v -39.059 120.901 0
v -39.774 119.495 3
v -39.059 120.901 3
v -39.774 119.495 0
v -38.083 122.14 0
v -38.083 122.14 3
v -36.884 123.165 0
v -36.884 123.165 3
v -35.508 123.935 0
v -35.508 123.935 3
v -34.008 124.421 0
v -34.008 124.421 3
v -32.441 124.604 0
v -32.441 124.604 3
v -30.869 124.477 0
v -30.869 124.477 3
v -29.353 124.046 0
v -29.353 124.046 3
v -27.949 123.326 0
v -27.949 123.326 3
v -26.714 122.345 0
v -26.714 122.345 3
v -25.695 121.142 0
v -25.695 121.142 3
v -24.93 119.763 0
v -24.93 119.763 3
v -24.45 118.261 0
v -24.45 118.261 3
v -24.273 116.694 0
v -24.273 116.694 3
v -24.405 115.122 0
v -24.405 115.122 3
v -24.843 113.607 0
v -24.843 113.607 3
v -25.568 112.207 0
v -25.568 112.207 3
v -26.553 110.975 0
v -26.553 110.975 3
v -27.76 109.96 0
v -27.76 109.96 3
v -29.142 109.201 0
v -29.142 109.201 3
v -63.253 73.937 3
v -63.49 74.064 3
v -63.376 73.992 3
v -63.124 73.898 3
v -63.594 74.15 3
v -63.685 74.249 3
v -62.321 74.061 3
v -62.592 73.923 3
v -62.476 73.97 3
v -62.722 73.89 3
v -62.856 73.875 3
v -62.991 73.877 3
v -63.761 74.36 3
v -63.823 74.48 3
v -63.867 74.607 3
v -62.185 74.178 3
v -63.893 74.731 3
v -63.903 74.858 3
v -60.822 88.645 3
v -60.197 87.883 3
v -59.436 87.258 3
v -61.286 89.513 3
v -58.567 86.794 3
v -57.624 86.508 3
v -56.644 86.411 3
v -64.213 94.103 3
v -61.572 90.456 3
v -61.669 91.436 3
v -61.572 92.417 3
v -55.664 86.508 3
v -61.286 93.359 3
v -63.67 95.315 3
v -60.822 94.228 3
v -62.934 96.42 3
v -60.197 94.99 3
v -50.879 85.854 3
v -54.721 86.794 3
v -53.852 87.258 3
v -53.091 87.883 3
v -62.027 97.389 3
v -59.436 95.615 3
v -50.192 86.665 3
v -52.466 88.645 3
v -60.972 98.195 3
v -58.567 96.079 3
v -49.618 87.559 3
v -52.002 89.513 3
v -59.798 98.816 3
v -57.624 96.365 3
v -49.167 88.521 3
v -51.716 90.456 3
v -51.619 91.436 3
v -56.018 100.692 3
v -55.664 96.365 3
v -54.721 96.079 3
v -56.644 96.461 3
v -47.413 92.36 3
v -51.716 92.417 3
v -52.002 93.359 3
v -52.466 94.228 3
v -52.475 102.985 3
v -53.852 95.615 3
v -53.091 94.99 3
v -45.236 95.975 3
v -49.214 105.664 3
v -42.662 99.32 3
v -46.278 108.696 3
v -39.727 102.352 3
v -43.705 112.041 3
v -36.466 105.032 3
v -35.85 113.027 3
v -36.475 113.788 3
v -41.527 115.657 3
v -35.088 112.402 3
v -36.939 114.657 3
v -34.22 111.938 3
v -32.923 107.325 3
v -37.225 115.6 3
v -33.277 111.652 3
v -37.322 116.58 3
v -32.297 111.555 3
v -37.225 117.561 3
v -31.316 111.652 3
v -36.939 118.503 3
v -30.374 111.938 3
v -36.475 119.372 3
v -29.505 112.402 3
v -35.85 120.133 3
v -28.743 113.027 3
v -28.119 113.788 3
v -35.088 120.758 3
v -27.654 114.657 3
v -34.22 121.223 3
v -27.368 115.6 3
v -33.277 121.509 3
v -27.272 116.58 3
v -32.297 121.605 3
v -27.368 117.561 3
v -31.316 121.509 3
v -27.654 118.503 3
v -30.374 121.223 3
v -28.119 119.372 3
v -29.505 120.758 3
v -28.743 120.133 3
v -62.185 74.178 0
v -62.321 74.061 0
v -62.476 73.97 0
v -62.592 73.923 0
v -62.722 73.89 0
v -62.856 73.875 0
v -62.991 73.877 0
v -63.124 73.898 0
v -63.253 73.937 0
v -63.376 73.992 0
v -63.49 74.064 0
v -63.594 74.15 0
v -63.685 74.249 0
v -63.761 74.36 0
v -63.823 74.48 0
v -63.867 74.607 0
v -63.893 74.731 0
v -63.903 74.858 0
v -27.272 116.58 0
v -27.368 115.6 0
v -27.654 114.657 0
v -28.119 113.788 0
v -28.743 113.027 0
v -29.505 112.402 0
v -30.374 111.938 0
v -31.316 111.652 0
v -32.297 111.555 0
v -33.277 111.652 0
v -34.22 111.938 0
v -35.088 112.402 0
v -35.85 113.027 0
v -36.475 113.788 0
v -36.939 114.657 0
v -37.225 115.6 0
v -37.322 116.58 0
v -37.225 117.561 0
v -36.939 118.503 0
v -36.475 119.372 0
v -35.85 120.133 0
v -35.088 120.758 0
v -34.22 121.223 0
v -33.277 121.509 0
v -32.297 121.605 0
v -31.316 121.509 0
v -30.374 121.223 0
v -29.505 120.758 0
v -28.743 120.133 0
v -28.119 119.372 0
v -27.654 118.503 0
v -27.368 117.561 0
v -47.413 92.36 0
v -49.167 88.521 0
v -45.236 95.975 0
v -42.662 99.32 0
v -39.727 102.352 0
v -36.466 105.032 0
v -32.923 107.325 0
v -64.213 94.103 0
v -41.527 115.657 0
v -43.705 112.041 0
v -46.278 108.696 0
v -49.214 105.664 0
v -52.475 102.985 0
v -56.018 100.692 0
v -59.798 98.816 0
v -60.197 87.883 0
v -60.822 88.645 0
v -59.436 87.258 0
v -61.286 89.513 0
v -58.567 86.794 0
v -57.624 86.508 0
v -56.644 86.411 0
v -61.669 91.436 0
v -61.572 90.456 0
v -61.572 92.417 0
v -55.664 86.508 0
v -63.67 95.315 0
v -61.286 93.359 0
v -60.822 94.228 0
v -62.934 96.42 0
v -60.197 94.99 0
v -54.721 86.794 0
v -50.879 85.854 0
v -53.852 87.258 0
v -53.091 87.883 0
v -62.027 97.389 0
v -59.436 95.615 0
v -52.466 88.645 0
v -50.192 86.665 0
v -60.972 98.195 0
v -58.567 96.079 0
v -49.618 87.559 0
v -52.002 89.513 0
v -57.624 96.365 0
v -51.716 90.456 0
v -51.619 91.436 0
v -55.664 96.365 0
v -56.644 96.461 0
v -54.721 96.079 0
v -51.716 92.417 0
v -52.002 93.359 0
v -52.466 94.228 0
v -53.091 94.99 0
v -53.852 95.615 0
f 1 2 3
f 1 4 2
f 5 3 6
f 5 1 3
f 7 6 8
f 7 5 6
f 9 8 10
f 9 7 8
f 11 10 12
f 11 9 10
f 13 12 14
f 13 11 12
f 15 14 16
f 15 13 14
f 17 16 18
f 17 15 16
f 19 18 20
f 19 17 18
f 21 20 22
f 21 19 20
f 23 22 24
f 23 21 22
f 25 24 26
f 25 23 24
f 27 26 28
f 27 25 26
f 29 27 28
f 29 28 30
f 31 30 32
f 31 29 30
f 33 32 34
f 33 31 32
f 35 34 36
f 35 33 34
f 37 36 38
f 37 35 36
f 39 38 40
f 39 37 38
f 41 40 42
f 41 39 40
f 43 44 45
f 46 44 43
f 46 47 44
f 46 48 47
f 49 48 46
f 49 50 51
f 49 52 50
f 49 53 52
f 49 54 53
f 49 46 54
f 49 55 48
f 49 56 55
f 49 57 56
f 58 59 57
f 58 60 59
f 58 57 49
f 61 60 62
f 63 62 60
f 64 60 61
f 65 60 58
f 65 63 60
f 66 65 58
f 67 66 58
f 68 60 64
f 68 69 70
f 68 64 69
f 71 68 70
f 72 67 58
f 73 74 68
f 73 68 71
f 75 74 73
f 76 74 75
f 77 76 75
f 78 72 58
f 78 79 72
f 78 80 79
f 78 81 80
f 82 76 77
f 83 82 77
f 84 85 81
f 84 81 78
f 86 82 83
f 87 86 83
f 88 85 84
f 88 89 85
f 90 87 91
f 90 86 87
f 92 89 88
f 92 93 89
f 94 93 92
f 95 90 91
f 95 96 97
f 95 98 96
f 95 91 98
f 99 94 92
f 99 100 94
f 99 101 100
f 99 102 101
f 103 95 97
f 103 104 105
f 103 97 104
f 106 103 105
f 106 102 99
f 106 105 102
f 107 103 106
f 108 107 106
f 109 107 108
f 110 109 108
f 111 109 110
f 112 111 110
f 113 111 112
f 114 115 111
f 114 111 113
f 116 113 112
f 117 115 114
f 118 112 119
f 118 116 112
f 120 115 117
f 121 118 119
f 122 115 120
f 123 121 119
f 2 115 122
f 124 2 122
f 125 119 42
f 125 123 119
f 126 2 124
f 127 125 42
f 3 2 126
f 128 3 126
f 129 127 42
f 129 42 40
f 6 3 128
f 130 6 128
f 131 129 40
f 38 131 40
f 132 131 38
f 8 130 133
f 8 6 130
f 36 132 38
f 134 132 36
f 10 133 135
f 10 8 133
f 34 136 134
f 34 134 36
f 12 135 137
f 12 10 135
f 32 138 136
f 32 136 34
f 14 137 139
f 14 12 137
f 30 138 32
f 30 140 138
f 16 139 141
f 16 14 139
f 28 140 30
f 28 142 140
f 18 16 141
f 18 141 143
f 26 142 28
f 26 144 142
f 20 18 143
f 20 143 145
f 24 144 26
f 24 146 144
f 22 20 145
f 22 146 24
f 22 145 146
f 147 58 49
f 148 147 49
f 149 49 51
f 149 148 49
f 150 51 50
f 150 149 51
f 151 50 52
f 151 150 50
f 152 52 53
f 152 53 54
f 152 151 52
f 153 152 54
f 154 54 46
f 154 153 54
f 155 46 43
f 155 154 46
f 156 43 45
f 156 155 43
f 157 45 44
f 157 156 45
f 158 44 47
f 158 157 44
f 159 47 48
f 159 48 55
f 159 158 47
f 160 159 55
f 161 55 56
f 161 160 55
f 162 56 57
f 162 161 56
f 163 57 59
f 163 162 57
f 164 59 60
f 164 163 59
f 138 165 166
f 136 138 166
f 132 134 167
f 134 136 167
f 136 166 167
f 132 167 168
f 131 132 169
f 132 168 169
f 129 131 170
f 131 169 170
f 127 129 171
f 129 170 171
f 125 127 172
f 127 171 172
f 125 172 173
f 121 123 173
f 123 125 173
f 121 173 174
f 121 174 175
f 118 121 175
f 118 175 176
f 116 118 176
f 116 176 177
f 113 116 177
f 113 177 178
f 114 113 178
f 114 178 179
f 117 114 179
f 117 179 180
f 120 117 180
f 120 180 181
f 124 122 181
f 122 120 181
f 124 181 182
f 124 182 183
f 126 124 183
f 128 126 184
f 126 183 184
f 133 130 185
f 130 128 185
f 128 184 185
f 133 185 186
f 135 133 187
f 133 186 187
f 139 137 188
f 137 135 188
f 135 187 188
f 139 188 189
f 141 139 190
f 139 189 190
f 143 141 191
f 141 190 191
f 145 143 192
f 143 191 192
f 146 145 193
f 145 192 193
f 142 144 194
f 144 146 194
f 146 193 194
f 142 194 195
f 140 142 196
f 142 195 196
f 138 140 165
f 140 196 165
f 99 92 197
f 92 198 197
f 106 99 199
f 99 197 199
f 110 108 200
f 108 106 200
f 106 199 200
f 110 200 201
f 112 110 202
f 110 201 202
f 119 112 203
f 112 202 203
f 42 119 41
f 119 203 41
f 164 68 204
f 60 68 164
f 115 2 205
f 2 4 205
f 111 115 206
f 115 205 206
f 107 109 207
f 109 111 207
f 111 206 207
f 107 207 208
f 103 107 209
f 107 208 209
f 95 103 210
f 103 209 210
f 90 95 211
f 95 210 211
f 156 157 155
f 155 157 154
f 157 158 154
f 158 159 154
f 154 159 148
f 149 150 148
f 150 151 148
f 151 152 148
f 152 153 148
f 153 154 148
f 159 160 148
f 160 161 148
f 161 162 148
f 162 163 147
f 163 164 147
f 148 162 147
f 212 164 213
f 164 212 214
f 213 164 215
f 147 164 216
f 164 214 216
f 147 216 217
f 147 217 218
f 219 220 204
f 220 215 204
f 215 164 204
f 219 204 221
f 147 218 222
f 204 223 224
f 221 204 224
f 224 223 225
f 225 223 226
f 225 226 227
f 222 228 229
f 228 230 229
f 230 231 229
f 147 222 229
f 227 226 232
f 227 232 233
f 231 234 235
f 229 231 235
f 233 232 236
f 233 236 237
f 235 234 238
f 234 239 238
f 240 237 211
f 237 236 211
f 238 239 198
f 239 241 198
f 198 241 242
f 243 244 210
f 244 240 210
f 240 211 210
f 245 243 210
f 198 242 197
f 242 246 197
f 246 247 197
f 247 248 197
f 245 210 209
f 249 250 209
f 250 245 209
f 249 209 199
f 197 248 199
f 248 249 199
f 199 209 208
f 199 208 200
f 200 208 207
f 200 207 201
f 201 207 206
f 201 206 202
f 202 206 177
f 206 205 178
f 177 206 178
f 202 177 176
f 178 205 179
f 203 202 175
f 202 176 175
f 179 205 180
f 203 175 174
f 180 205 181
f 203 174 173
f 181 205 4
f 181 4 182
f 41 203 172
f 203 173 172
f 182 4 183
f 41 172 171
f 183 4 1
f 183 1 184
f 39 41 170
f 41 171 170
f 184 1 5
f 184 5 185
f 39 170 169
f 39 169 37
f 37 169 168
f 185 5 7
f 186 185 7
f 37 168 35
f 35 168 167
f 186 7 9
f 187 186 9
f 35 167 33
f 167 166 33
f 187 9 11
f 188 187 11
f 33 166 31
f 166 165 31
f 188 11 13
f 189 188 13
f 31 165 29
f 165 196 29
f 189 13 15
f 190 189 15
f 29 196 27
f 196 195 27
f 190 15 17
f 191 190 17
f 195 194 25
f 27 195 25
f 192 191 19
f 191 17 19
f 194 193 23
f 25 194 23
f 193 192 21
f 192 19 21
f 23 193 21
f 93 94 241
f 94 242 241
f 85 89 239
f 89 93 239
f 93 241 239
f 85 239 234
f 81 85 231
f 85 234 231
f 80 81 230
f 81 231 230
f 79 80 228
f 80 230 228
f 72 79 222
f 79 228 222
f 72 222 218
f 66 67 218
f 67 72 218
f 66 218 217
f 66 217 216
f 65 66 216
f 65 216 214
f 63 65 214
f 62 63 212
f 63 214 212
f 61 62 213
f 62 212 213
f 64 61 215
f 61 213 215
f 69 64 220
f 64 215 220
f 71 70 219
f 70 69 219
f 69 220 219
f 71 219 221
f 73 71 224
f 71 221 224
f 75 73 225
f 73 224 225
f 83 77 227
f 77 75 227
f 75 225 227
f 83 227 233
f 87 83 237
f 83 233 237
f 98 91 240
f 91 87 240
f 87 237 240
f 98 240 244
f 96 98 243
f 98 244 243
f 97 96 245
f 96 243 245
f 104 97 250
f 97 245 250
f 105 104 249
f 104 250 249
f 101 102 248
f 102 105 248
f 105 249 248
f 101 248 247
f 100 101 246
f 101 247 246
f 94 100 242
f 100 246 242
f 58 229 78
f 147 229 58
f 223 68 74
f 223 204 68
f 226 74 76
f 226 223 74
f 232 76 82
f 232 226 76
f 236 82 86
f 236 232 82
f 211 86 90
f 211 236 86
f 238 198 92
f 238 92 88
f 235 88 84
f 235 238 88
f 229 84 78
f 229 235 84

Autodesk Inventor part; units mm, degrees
ref_plane "YZ Plane" through (0, 0, 0) normal (1, 0, 0) x (0, 1, 0)
ref_plane "XZ Plane" through (0, 0, 0) normal (0, 1, 0) x (-1, 0, 0)
ref_plane "XY Plane" through (0, 0, 0) normal (0, 0, 1) x (1, 0, 0)
sketch "スケッチ2" plane through (0, 0, 0) normal (0, 0, 1) x (1, 0, 0)
  circle A0 centre (-56.644, 91.4364) radius 8.025
  circle A1 centre (-56.644, 91.4364) radius 5.025
  arc A2 (-29.1424, 109.2011) -> (-49.1672, 88.5212) centre (-14.5297, 75.0161) ccw
  arc A3 (-59.7983, 98.8155) -> (-39.7735, 119.4954) centre (-74.411, 133.0005) ccw
  circle A4 centre (-32.2967, 116.5802) radius 8.025
  circle A5 centre (-32.2967, 116.5802) radius 5.025
  line L0 (-50.8789, 85.8539) -> (-64.3562, 71.9357)
  line L1 (-64.3562, 71.9357) -> (-64.668, 91.3073)
  line L2 (-56.644, 91.4364) -> (-32.2967, 116.5802) construction
  point P0 (0, 0)
  point P1 (0, 0)
  dimension "d5" = 45
extrude "押し出し2" add sketch "スケッチ2" along normal blind 3
fillet "フィレット2" radius 0.5 1 edges at (-64.3562, 71.9357, 1.5)
sketch "スケッチ3" plane through (0, 0, 3) normal (0, 0, 1) x (1, 0, 0)
  line L0 (-63.5165, 72.8029) -> (-50.8789, 85.8539) projected
  arc A0 (-64.3756, 73.1427) -> (-63.5165, 72.8029) centre (-63.8757, 73.1507) ccw projected
  line L1 (-64.668, 91.3073) -> (-64.3756, 73.1427) projected
  arc A1 (-59.7983, 98.8155) -> (-64.668, 91.3073) centre (-56.644, 91.4364) ccw projected
  circle A2 centre (-56.644, 91.4364) radius 5.025 projected
  arc A3 (-50.8789, 85.8539) -> (-49.1672, 88.5212) centre (-56.644, 91.4364) ccw projected
  line L2 (-64.2129, 94.1033) -> (-63.8416, 71.0319)
  point P0 (0, 0)
  point P1 (-63.8676, 72.6508)
  dimension "d9" = 0.5
extrude "押し出し3" cut sketch "スケッチ3" against normal through all
fillet "フィレット3" radius 1 1 edges at (-63.8676, 72.6508, 1.5)
properties part number "アーム揺動節2" material "アルミニウム 2014-T4"
